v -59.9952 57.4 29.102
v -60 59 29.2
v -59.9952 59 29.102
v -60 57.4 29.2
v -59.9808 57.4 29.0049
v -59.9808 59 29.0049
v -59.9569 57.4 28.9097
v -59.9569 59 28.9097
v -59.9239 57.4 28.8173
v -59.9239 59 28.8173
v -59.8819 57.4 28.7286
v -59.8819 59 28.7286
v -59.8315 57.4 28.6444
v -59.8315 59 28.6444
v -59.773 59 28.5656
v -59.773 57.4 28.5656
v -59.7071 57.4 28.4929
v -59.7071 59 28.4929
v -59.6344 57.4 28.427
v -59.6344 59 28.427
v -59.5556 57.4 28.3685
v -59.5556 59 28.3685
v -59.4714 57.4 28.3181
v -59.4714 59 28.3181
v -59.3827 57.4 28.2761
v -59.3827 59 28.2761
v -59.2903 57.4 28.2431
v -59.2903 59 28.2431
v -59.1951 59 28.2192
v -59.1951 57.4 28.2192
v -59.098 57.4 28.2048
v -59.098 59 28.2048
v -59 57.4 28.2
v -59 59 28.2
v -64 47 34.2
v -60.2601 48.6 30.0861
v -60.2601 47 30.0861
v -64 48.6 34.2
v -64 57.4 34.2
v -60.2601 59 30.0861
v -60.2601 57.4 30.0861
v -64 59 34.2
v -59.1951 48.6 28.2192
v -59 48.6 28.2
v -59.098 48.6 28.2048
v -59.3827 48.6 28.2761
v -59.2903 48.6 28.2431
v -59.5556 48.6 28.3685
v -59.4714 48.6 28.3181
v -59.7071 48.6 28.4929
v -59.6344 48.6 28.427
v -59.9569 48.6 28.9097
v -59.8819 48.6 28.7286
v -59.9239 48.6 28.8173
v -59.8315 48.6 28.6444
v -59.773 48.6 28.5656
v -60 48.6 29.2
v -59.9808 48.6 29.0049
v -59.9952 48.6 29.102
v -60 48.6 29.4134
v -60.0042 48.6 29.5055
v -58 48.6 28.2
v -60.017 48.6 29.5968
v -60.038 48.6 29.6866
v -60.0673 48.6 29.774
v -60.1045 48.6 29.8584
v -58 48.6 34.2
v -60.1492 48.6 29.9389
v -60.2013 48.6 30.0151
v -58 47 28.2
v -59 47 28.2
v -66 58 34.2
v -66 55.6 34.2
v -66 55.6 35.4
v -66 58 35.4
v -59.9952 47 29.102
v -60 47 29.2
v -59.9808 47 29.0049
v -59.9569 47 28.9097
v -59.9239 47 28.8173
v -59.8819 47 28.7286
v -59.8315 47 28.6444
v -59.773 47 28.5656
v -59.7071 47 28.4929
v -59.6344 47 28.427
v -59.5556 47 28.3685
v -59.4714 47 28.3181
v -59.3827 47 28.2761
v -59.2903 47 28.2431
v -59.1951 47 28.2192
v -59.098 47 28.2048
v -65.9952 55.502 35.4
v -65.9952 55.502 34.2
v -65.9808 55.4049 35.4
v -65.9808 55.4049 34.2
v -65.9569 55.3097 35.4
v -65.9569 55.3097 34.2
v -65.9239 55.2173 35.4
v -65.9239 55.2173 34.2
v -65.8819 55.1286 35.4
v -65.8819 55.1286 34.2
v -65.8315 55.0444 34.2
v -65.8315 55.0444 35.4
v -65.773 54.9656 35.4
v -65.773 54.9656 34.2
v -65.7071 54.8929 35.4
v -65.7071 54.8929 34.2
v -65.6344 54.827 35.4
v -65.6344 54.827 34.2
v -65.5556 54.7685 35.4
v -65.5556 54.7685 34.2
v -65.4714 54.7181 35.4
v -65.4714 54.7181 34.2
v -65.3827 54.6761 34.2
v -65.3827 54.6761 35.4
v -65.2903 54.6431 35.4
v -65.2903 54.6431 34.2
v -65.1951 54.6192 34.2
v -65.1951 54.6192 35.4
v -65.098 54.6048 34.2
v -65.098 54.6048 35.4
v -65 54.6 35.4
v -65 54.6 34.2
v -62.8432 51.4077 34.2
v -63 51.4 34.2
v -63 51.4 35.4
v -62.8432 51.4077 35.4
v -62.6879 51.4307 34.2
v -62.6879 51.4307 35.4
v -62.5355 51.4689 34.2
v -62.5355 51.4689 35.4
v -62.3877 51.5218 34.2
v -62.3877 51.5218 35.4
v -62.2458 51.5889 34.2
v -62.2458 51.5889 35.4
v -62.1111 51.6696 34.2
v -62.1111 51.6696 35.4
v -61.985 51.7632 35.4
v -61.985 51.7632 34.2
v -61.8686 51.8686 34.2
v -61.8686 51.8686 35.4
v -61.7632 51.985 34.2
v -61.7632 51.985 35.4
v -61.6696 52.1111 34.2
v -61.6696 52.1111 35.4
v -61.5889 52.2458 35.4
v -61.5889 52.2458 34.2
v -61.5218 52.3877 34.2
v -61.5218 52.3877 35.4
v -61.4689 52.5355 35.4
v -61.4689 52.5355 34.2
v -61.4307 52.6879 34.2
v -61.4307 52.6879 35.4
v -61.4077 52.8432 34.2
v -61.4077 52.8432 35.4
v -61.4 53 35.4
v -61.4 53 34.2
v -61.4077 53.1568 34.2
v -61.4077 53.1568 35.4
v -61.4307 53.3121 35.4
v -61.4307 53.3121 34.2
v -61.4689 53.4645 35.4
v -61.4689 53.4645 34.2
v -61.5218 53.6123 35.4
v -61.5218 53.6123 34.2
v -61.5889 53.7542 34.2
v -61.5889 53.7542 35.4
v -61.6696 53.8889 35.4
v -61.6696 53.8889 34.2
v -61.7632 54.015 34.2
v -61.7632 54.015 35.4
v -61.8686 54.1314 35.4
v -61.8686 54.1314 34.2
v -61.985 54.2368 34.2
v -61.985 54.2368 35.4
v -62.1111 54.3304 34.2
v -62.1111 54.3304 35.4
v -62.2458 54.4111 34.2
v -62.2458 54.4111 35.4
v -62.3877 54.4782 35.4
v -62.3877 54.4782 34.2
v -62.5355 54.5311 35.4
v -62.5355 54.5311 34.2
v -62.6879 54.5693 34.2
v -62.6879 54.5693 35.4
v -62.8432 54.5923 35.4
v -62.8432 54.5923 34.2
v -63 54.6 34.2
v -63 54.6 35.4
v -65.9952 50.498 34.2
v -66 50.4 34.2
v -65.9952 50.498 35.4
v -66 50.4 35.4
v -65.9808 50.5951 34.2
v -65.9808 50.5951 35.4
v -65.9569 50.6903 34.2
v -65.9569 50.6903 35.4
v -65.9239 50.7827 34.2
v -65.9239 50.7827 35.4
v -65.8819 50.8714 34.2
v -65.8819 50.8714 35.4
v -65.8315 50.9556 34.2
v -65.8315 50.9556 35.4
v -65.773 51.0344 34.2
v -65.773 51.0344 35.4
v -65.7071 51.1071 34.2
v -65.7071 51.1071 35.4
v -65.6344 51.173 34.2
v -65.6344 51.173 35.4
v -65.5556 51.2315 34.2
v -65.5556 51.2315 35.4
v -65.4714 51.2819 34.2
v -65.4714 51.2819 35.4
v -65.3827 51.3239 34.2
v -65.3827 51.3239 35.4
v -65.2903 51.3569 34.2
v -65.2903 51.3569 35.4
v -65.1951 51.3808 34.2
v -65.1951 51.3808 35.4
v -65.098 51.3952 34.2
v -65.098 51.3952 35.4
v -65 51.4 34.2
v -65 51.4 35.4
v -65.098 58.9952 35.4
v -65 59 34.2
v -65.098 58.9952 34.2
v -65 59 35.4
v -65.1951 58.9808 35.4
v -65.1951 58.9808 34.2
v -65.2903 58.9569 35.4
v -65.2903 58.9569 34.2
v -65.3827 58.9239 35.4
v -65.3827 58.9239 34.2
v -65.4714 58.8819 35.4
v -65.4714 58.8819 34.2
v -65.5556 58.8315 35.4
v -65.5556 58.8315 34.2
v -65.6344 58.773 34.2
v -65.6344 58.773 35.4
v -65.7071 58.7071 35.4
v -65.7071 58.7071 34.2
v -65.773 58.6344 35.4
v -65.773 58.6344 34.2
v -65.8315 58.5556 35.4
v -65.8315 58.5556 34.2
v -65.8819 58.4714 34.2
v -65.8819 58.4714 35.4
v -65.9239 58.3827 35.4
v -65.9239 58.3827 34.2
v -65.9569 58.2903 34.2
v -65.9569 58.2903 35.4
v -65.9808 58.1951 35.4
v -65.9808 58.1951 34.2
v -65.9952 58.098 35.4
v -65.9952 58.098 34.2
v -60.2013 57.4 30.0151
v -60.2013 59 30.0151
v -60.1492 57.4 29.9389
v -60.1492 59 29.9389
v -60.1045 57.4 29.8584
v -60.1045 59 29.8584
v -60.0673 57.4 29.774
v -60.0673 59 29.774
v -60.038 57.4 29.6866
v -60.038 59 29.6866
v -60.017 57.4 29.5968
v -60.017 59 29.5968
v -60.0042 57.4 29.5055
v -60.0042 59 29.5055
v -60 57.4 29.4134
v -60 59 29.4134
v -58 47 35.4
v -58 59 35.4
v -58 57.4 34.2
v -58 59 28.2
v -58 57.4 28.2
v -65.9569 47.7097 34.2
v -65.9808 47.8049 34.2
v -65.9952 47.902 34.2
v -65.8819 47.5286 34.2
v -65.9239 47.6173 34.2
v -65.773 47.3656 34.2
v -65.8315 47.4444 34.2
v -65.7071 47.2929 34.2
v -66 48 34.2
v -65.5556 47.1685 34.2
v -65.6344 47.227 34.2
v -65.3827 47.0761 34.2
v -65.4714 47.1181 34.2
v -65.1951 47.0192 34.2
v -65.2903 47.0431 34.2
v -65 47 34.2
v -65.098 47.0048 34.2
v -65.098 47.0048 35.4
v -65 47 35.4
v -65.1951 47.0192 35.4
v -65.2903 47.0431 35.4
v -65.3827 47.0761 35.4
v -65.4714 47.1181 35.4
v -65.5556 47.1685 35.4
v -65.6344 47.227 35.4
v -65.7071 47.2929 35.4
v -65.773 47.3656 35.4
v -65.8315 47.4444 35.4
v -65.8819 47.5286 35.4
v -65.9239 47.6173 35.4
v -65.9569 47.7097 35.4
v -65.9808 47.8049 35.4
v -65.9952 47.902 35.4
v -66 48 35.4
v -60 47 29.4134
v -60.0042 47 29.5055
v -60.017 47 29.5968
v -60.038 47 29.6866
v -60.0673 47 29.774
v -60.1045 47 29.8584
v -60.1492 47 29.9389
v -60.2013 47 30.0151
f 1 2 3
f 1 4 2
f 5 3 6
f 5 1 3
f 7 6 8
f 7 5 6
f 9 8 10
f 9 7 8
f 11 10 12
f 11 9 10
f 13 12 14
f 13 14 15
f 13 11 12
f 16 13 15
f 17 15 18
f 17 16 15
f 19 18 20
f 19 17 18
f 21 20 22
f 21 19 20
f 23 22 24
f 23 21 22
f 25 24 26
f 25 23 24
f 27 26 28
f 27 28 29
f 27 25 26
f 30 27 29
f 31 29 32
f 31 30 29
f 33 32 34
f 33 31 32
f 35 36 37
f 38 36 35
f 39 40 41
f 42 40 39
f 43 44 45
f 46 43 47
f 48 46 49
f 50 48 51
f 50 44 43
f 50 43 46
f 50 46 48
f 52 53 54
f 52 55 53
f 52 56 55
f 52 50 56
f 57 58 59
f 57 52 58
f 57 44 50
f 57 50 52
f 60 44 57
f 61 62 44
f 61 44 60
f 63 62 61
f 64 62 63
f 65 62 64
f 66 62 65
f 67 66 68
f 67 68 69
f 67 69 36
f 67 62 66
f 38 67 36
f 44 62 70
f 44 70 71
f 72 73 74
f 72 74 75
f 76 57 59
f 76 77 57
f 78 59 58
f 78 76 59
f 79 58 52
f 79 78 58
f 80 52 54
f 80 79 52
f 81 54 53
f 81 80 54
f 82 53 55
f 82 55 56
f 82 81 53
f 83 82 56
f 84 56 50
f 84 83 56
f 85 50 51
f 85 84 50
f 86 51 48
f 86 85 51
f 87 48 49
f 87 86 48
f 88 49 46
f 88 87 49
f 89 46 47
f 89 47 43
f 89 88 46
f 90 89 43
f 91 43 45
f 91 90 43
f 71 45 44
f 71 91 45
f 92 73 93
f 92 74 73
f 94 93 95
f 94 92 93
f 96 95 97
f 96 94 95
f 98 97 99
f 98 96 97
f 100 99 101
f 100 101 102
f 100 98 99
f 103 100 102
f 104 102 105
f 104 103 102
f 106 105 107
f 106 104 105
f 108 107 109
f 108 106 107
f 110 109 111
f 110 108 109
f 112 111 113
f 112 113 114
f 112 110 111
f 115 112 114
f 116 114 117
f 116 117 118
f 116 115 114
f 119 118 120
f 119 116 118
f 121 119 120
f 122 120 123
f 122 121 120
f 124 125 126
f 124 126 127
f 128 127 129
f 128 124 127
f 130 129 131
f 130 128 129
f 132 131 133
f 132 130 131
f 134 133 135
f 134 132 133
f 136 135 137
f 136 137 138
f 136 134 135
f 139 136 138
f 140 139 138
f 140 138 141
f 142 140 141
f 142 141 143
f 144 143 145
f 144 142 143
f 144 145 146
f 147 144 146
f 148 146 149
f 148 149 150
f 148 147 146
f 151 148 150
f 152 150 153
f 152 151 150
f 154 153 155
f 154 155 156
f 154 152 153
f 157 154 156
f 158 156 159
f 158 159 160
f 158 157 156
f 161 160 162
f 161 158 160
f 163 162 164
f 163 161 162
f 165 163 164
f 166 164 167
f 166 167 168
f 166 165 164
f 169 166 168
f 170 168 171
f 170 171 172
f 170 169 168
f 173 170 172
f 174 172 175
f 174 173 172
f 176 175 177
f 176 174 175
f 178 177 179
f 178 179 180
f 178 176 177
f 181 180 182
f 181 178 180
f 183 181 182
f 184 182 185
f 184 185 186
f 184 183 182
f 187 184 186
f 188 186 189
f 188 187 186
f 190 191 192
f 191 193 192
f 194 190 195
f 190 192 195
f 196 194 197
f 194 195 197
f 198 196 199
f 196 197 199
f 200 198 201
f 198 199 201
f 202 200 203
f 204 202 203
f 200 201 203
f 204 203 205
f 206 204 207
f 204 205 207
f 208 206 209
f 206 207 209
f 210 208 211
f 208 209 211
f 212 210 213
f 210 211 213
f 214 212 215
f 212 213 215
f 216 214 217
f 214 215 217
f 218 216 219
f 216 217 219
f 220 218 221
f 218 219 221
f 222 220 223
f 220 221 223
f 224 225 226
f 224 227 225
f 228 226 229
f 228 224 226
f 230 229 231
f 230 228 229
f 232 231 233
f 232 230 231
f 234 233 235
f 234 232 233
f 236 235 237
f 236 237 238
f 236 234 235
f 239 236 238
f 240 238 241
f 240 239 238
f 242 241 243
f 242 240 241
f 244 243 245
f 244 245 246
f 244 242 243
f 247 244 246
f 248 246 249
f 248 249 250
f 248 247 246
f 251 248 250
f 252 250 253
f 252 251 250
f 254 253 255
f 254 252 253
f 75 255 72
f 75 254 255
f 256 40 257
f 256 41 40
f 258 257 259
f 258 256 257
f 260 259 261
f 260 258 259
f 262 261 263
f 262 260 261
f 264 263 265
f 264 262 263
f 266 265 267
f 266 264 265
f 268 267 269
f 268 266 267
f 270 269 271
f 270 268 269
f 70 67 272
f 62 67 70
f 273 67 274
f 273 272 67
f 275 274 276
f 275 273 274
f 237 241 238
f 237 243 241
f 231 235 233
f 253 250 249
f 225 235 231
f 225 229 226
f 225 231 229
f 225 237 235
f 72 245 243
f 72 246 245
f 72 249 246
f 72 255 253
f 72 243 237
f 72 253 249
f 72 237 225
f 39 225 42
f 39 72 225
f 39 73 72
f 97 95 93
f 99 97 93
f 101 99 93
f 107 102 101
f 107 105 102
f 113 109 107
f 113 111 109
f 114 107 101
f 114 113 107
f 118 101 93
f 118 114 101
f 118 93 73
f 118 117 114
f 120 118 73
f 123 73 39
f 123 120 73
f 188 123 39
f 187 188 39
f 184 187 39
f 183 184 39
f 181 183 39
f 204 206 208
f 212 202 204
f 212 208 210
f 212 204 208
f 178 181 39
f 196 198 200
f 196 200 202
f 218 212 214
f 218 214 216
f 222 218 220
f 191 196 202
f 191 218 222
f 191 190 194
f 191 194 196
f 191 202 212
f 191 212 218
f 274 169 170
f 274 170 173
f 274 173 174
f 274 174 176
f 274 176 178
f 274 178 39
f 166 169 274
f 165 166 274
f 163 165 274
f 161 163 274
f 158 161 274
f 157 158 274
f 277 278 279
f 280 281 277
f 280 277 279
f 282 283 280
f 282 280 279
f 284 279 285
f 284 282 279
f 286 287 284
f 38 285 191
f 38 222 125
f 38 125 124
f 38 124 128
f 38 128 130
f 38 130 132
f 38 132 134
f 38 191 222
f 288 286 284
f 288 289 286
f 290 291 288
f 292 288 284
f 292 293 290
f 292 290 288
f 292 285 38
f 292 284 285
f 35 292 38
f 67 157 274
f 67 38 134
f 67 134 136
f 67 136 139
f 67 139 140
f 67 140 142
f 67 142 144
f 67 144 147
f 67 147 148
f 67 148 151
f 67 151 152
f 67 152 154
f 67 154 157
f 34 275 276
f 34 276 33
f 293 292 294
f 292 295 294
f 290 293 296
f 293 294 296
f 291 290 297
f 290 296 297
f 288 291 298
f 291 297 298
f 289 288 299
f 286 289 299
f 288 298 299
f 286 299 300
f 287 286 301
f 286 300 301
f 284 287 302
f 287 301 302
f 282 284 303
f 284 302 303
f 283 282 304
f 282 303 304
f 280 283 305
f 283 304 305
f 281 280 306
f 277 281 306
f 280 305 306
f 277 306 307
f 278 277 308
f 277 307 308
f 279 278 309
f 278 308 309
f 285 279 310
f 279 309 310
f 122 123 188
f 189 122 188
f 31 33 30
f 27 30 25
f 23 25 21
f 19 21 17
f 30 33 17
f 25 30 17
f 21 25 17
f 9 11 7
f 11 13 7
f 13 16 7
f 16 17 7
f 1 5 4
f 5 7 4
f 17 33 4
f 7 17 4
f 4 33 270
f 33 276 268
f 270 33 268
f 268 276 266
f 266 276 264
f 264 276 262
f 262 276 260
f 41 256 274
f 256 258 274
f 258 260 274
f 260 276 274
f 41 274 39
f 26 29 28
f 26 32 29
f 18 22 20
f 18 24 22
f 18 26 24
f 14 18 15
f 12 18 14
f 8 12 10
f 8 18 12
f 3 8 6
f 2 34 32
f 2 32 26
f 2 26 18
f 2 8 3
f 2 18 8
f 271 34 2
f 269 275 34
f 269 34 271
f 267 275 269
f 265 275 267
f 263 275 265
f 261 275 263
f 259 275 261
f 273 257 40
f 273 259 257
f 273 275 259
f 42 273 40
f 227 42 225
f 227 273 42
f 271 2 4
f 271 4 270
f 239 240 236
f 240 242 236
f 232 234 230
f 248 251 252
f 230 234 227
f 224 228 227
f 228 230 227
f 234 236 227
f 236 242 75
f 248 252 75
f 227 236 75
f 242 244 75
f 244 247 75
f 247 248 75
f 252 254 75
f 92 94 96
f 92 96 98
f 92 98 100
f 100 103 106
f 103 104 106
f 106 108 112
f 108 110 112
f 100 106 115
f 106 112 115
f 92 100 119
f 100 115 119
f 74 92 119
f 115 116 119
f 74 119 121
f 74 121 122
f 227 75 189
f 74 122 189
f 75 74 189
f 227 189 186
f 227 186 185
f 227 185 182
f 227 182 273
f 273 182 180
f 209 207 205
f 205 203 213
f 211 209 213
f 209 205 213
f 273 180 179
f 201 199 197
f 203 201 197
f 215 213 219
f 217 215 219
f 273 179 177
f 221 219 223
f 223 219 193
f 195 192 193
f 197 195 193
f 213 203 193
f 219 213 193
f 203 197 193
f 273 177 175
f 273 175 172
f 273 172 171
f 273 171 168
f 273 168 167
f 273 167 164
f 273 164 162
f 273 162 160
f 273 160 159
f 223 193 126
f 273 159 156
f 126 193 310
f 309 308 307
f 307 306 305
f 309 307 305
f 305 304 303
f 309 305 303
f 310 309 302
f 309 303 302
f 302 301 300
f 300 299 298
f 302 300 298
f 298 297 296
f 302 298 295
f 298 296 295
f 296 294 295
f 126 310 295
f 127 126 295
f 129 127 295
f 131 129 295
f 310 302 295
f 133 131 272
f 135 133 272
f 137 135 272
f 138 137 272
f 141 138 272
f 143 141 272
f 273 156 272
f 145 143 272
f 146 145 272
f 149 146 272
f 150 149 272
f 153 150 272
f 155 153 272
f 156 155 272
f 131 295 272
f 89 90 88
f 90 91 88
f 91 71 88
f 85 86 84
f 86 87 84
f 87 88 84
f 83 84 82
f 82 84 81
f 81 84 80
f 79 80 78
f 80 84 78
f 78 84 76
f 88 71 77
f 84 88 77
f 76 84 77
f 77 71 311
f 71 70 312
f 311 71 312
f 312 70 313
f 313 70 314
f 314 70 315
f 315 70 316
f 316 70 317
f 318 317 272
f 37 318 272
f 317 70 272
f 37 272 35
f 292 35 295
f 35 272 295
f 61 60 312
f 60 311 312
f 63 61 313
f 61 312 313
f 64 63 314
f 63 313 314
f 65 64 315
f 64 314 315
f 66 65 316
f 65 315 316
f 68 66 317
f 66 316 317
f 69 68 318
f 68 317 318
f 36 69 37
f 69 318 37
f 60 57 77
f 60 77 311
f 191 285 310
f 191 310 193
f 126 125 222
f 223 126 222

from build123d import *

# Parameters (mm, degrees)
PAD040_DEPTH            = 1.2
PAD041_DEPTH            = 1.6
LINEARPATTERN003_COUNT  = 2
LINEARPATTERN003_PITCH  = 10.4
FILLET009_R             = 1
FILLET010_R             = 1
FILLET011_R             = 1
BODY013_PLACEMENT_ANGLE = 180


with BuildPart() as part:
    # Sketch072 → Pad040 (new body)
    with BuildSketch(Plane.XY):
        with BuildLine():
            Line((-4, 6), (4, 6))
            Line((4, 6), (4, 1.6))
            Line((1, 1.6), (4, 1.6))
            ThreePointArc((1, 1.6), (-0.6, 0), (1, -1.6))
            Line((4, -1.6), (1, -1.6))
            Line((4, -1.6), (4, -6))
            Line((4, -6), (-4, -6))
            Line((-4, -6), (-4, 6))
        make_face()
    extrude(amount=PAD040_DEPTH)

    # Sketch073 (on DatumPlane) → Pad041 (join)
    with BuildSketch(Plane.XZ.offset(6)):
        Polygon((-4, 0), (-4, -6), (-2, -6), (-2, -4.4), (2, 0), align=None)
    pad041 = extrude(amount=-PAD041_DEPTH)

    # LinearPattern003: Pad041 ×2
    with Locations(*[(0, i * LINEARPATTERN003_PITCH, 0) for i in range(1, LINEARPATTERN003_COUNT)]):
        add(pad041)

    # Fillet009
    fillet009_edges = [part.edges().sort_by_distance(p)[0] for p in [
        (-2, -5.2, -6),
        (-2, 5.2, -6),
    ]]
    fillet(fillet009_edges, radius=FILLET009_R)

    # Fillet010
    fillet010_edges = [part.edges().sort_by_distance(p)[0] for p in [
        (-2, -5.2, -4.4),
        (-2, 5.2, -4.4),
    ]]
    fillet(fillet010_edges, radius=FILLET010_R)

    # Fillet011
    fillet011_edges = [part.edges().sort_by_distance(p)[0] for p in [
        (4, -6, 0.6),
        (4, -1.6, 0.6),
        (4, 1.6, 0.6),
        (4, 6, 0.6),
    ]]
    fillet(fillet011_edges, radius=FILLET011_R)


with BuildPart() as part_1:
    # Body013 placement: moved
    add(part.part.moved(Location((-62, 53, 34.2))).rotate(Axis((-62, 53, 34.2), (0, 0, 1)), BODY013_PLACEMENT_ANGLE))


solid = part_1.part
